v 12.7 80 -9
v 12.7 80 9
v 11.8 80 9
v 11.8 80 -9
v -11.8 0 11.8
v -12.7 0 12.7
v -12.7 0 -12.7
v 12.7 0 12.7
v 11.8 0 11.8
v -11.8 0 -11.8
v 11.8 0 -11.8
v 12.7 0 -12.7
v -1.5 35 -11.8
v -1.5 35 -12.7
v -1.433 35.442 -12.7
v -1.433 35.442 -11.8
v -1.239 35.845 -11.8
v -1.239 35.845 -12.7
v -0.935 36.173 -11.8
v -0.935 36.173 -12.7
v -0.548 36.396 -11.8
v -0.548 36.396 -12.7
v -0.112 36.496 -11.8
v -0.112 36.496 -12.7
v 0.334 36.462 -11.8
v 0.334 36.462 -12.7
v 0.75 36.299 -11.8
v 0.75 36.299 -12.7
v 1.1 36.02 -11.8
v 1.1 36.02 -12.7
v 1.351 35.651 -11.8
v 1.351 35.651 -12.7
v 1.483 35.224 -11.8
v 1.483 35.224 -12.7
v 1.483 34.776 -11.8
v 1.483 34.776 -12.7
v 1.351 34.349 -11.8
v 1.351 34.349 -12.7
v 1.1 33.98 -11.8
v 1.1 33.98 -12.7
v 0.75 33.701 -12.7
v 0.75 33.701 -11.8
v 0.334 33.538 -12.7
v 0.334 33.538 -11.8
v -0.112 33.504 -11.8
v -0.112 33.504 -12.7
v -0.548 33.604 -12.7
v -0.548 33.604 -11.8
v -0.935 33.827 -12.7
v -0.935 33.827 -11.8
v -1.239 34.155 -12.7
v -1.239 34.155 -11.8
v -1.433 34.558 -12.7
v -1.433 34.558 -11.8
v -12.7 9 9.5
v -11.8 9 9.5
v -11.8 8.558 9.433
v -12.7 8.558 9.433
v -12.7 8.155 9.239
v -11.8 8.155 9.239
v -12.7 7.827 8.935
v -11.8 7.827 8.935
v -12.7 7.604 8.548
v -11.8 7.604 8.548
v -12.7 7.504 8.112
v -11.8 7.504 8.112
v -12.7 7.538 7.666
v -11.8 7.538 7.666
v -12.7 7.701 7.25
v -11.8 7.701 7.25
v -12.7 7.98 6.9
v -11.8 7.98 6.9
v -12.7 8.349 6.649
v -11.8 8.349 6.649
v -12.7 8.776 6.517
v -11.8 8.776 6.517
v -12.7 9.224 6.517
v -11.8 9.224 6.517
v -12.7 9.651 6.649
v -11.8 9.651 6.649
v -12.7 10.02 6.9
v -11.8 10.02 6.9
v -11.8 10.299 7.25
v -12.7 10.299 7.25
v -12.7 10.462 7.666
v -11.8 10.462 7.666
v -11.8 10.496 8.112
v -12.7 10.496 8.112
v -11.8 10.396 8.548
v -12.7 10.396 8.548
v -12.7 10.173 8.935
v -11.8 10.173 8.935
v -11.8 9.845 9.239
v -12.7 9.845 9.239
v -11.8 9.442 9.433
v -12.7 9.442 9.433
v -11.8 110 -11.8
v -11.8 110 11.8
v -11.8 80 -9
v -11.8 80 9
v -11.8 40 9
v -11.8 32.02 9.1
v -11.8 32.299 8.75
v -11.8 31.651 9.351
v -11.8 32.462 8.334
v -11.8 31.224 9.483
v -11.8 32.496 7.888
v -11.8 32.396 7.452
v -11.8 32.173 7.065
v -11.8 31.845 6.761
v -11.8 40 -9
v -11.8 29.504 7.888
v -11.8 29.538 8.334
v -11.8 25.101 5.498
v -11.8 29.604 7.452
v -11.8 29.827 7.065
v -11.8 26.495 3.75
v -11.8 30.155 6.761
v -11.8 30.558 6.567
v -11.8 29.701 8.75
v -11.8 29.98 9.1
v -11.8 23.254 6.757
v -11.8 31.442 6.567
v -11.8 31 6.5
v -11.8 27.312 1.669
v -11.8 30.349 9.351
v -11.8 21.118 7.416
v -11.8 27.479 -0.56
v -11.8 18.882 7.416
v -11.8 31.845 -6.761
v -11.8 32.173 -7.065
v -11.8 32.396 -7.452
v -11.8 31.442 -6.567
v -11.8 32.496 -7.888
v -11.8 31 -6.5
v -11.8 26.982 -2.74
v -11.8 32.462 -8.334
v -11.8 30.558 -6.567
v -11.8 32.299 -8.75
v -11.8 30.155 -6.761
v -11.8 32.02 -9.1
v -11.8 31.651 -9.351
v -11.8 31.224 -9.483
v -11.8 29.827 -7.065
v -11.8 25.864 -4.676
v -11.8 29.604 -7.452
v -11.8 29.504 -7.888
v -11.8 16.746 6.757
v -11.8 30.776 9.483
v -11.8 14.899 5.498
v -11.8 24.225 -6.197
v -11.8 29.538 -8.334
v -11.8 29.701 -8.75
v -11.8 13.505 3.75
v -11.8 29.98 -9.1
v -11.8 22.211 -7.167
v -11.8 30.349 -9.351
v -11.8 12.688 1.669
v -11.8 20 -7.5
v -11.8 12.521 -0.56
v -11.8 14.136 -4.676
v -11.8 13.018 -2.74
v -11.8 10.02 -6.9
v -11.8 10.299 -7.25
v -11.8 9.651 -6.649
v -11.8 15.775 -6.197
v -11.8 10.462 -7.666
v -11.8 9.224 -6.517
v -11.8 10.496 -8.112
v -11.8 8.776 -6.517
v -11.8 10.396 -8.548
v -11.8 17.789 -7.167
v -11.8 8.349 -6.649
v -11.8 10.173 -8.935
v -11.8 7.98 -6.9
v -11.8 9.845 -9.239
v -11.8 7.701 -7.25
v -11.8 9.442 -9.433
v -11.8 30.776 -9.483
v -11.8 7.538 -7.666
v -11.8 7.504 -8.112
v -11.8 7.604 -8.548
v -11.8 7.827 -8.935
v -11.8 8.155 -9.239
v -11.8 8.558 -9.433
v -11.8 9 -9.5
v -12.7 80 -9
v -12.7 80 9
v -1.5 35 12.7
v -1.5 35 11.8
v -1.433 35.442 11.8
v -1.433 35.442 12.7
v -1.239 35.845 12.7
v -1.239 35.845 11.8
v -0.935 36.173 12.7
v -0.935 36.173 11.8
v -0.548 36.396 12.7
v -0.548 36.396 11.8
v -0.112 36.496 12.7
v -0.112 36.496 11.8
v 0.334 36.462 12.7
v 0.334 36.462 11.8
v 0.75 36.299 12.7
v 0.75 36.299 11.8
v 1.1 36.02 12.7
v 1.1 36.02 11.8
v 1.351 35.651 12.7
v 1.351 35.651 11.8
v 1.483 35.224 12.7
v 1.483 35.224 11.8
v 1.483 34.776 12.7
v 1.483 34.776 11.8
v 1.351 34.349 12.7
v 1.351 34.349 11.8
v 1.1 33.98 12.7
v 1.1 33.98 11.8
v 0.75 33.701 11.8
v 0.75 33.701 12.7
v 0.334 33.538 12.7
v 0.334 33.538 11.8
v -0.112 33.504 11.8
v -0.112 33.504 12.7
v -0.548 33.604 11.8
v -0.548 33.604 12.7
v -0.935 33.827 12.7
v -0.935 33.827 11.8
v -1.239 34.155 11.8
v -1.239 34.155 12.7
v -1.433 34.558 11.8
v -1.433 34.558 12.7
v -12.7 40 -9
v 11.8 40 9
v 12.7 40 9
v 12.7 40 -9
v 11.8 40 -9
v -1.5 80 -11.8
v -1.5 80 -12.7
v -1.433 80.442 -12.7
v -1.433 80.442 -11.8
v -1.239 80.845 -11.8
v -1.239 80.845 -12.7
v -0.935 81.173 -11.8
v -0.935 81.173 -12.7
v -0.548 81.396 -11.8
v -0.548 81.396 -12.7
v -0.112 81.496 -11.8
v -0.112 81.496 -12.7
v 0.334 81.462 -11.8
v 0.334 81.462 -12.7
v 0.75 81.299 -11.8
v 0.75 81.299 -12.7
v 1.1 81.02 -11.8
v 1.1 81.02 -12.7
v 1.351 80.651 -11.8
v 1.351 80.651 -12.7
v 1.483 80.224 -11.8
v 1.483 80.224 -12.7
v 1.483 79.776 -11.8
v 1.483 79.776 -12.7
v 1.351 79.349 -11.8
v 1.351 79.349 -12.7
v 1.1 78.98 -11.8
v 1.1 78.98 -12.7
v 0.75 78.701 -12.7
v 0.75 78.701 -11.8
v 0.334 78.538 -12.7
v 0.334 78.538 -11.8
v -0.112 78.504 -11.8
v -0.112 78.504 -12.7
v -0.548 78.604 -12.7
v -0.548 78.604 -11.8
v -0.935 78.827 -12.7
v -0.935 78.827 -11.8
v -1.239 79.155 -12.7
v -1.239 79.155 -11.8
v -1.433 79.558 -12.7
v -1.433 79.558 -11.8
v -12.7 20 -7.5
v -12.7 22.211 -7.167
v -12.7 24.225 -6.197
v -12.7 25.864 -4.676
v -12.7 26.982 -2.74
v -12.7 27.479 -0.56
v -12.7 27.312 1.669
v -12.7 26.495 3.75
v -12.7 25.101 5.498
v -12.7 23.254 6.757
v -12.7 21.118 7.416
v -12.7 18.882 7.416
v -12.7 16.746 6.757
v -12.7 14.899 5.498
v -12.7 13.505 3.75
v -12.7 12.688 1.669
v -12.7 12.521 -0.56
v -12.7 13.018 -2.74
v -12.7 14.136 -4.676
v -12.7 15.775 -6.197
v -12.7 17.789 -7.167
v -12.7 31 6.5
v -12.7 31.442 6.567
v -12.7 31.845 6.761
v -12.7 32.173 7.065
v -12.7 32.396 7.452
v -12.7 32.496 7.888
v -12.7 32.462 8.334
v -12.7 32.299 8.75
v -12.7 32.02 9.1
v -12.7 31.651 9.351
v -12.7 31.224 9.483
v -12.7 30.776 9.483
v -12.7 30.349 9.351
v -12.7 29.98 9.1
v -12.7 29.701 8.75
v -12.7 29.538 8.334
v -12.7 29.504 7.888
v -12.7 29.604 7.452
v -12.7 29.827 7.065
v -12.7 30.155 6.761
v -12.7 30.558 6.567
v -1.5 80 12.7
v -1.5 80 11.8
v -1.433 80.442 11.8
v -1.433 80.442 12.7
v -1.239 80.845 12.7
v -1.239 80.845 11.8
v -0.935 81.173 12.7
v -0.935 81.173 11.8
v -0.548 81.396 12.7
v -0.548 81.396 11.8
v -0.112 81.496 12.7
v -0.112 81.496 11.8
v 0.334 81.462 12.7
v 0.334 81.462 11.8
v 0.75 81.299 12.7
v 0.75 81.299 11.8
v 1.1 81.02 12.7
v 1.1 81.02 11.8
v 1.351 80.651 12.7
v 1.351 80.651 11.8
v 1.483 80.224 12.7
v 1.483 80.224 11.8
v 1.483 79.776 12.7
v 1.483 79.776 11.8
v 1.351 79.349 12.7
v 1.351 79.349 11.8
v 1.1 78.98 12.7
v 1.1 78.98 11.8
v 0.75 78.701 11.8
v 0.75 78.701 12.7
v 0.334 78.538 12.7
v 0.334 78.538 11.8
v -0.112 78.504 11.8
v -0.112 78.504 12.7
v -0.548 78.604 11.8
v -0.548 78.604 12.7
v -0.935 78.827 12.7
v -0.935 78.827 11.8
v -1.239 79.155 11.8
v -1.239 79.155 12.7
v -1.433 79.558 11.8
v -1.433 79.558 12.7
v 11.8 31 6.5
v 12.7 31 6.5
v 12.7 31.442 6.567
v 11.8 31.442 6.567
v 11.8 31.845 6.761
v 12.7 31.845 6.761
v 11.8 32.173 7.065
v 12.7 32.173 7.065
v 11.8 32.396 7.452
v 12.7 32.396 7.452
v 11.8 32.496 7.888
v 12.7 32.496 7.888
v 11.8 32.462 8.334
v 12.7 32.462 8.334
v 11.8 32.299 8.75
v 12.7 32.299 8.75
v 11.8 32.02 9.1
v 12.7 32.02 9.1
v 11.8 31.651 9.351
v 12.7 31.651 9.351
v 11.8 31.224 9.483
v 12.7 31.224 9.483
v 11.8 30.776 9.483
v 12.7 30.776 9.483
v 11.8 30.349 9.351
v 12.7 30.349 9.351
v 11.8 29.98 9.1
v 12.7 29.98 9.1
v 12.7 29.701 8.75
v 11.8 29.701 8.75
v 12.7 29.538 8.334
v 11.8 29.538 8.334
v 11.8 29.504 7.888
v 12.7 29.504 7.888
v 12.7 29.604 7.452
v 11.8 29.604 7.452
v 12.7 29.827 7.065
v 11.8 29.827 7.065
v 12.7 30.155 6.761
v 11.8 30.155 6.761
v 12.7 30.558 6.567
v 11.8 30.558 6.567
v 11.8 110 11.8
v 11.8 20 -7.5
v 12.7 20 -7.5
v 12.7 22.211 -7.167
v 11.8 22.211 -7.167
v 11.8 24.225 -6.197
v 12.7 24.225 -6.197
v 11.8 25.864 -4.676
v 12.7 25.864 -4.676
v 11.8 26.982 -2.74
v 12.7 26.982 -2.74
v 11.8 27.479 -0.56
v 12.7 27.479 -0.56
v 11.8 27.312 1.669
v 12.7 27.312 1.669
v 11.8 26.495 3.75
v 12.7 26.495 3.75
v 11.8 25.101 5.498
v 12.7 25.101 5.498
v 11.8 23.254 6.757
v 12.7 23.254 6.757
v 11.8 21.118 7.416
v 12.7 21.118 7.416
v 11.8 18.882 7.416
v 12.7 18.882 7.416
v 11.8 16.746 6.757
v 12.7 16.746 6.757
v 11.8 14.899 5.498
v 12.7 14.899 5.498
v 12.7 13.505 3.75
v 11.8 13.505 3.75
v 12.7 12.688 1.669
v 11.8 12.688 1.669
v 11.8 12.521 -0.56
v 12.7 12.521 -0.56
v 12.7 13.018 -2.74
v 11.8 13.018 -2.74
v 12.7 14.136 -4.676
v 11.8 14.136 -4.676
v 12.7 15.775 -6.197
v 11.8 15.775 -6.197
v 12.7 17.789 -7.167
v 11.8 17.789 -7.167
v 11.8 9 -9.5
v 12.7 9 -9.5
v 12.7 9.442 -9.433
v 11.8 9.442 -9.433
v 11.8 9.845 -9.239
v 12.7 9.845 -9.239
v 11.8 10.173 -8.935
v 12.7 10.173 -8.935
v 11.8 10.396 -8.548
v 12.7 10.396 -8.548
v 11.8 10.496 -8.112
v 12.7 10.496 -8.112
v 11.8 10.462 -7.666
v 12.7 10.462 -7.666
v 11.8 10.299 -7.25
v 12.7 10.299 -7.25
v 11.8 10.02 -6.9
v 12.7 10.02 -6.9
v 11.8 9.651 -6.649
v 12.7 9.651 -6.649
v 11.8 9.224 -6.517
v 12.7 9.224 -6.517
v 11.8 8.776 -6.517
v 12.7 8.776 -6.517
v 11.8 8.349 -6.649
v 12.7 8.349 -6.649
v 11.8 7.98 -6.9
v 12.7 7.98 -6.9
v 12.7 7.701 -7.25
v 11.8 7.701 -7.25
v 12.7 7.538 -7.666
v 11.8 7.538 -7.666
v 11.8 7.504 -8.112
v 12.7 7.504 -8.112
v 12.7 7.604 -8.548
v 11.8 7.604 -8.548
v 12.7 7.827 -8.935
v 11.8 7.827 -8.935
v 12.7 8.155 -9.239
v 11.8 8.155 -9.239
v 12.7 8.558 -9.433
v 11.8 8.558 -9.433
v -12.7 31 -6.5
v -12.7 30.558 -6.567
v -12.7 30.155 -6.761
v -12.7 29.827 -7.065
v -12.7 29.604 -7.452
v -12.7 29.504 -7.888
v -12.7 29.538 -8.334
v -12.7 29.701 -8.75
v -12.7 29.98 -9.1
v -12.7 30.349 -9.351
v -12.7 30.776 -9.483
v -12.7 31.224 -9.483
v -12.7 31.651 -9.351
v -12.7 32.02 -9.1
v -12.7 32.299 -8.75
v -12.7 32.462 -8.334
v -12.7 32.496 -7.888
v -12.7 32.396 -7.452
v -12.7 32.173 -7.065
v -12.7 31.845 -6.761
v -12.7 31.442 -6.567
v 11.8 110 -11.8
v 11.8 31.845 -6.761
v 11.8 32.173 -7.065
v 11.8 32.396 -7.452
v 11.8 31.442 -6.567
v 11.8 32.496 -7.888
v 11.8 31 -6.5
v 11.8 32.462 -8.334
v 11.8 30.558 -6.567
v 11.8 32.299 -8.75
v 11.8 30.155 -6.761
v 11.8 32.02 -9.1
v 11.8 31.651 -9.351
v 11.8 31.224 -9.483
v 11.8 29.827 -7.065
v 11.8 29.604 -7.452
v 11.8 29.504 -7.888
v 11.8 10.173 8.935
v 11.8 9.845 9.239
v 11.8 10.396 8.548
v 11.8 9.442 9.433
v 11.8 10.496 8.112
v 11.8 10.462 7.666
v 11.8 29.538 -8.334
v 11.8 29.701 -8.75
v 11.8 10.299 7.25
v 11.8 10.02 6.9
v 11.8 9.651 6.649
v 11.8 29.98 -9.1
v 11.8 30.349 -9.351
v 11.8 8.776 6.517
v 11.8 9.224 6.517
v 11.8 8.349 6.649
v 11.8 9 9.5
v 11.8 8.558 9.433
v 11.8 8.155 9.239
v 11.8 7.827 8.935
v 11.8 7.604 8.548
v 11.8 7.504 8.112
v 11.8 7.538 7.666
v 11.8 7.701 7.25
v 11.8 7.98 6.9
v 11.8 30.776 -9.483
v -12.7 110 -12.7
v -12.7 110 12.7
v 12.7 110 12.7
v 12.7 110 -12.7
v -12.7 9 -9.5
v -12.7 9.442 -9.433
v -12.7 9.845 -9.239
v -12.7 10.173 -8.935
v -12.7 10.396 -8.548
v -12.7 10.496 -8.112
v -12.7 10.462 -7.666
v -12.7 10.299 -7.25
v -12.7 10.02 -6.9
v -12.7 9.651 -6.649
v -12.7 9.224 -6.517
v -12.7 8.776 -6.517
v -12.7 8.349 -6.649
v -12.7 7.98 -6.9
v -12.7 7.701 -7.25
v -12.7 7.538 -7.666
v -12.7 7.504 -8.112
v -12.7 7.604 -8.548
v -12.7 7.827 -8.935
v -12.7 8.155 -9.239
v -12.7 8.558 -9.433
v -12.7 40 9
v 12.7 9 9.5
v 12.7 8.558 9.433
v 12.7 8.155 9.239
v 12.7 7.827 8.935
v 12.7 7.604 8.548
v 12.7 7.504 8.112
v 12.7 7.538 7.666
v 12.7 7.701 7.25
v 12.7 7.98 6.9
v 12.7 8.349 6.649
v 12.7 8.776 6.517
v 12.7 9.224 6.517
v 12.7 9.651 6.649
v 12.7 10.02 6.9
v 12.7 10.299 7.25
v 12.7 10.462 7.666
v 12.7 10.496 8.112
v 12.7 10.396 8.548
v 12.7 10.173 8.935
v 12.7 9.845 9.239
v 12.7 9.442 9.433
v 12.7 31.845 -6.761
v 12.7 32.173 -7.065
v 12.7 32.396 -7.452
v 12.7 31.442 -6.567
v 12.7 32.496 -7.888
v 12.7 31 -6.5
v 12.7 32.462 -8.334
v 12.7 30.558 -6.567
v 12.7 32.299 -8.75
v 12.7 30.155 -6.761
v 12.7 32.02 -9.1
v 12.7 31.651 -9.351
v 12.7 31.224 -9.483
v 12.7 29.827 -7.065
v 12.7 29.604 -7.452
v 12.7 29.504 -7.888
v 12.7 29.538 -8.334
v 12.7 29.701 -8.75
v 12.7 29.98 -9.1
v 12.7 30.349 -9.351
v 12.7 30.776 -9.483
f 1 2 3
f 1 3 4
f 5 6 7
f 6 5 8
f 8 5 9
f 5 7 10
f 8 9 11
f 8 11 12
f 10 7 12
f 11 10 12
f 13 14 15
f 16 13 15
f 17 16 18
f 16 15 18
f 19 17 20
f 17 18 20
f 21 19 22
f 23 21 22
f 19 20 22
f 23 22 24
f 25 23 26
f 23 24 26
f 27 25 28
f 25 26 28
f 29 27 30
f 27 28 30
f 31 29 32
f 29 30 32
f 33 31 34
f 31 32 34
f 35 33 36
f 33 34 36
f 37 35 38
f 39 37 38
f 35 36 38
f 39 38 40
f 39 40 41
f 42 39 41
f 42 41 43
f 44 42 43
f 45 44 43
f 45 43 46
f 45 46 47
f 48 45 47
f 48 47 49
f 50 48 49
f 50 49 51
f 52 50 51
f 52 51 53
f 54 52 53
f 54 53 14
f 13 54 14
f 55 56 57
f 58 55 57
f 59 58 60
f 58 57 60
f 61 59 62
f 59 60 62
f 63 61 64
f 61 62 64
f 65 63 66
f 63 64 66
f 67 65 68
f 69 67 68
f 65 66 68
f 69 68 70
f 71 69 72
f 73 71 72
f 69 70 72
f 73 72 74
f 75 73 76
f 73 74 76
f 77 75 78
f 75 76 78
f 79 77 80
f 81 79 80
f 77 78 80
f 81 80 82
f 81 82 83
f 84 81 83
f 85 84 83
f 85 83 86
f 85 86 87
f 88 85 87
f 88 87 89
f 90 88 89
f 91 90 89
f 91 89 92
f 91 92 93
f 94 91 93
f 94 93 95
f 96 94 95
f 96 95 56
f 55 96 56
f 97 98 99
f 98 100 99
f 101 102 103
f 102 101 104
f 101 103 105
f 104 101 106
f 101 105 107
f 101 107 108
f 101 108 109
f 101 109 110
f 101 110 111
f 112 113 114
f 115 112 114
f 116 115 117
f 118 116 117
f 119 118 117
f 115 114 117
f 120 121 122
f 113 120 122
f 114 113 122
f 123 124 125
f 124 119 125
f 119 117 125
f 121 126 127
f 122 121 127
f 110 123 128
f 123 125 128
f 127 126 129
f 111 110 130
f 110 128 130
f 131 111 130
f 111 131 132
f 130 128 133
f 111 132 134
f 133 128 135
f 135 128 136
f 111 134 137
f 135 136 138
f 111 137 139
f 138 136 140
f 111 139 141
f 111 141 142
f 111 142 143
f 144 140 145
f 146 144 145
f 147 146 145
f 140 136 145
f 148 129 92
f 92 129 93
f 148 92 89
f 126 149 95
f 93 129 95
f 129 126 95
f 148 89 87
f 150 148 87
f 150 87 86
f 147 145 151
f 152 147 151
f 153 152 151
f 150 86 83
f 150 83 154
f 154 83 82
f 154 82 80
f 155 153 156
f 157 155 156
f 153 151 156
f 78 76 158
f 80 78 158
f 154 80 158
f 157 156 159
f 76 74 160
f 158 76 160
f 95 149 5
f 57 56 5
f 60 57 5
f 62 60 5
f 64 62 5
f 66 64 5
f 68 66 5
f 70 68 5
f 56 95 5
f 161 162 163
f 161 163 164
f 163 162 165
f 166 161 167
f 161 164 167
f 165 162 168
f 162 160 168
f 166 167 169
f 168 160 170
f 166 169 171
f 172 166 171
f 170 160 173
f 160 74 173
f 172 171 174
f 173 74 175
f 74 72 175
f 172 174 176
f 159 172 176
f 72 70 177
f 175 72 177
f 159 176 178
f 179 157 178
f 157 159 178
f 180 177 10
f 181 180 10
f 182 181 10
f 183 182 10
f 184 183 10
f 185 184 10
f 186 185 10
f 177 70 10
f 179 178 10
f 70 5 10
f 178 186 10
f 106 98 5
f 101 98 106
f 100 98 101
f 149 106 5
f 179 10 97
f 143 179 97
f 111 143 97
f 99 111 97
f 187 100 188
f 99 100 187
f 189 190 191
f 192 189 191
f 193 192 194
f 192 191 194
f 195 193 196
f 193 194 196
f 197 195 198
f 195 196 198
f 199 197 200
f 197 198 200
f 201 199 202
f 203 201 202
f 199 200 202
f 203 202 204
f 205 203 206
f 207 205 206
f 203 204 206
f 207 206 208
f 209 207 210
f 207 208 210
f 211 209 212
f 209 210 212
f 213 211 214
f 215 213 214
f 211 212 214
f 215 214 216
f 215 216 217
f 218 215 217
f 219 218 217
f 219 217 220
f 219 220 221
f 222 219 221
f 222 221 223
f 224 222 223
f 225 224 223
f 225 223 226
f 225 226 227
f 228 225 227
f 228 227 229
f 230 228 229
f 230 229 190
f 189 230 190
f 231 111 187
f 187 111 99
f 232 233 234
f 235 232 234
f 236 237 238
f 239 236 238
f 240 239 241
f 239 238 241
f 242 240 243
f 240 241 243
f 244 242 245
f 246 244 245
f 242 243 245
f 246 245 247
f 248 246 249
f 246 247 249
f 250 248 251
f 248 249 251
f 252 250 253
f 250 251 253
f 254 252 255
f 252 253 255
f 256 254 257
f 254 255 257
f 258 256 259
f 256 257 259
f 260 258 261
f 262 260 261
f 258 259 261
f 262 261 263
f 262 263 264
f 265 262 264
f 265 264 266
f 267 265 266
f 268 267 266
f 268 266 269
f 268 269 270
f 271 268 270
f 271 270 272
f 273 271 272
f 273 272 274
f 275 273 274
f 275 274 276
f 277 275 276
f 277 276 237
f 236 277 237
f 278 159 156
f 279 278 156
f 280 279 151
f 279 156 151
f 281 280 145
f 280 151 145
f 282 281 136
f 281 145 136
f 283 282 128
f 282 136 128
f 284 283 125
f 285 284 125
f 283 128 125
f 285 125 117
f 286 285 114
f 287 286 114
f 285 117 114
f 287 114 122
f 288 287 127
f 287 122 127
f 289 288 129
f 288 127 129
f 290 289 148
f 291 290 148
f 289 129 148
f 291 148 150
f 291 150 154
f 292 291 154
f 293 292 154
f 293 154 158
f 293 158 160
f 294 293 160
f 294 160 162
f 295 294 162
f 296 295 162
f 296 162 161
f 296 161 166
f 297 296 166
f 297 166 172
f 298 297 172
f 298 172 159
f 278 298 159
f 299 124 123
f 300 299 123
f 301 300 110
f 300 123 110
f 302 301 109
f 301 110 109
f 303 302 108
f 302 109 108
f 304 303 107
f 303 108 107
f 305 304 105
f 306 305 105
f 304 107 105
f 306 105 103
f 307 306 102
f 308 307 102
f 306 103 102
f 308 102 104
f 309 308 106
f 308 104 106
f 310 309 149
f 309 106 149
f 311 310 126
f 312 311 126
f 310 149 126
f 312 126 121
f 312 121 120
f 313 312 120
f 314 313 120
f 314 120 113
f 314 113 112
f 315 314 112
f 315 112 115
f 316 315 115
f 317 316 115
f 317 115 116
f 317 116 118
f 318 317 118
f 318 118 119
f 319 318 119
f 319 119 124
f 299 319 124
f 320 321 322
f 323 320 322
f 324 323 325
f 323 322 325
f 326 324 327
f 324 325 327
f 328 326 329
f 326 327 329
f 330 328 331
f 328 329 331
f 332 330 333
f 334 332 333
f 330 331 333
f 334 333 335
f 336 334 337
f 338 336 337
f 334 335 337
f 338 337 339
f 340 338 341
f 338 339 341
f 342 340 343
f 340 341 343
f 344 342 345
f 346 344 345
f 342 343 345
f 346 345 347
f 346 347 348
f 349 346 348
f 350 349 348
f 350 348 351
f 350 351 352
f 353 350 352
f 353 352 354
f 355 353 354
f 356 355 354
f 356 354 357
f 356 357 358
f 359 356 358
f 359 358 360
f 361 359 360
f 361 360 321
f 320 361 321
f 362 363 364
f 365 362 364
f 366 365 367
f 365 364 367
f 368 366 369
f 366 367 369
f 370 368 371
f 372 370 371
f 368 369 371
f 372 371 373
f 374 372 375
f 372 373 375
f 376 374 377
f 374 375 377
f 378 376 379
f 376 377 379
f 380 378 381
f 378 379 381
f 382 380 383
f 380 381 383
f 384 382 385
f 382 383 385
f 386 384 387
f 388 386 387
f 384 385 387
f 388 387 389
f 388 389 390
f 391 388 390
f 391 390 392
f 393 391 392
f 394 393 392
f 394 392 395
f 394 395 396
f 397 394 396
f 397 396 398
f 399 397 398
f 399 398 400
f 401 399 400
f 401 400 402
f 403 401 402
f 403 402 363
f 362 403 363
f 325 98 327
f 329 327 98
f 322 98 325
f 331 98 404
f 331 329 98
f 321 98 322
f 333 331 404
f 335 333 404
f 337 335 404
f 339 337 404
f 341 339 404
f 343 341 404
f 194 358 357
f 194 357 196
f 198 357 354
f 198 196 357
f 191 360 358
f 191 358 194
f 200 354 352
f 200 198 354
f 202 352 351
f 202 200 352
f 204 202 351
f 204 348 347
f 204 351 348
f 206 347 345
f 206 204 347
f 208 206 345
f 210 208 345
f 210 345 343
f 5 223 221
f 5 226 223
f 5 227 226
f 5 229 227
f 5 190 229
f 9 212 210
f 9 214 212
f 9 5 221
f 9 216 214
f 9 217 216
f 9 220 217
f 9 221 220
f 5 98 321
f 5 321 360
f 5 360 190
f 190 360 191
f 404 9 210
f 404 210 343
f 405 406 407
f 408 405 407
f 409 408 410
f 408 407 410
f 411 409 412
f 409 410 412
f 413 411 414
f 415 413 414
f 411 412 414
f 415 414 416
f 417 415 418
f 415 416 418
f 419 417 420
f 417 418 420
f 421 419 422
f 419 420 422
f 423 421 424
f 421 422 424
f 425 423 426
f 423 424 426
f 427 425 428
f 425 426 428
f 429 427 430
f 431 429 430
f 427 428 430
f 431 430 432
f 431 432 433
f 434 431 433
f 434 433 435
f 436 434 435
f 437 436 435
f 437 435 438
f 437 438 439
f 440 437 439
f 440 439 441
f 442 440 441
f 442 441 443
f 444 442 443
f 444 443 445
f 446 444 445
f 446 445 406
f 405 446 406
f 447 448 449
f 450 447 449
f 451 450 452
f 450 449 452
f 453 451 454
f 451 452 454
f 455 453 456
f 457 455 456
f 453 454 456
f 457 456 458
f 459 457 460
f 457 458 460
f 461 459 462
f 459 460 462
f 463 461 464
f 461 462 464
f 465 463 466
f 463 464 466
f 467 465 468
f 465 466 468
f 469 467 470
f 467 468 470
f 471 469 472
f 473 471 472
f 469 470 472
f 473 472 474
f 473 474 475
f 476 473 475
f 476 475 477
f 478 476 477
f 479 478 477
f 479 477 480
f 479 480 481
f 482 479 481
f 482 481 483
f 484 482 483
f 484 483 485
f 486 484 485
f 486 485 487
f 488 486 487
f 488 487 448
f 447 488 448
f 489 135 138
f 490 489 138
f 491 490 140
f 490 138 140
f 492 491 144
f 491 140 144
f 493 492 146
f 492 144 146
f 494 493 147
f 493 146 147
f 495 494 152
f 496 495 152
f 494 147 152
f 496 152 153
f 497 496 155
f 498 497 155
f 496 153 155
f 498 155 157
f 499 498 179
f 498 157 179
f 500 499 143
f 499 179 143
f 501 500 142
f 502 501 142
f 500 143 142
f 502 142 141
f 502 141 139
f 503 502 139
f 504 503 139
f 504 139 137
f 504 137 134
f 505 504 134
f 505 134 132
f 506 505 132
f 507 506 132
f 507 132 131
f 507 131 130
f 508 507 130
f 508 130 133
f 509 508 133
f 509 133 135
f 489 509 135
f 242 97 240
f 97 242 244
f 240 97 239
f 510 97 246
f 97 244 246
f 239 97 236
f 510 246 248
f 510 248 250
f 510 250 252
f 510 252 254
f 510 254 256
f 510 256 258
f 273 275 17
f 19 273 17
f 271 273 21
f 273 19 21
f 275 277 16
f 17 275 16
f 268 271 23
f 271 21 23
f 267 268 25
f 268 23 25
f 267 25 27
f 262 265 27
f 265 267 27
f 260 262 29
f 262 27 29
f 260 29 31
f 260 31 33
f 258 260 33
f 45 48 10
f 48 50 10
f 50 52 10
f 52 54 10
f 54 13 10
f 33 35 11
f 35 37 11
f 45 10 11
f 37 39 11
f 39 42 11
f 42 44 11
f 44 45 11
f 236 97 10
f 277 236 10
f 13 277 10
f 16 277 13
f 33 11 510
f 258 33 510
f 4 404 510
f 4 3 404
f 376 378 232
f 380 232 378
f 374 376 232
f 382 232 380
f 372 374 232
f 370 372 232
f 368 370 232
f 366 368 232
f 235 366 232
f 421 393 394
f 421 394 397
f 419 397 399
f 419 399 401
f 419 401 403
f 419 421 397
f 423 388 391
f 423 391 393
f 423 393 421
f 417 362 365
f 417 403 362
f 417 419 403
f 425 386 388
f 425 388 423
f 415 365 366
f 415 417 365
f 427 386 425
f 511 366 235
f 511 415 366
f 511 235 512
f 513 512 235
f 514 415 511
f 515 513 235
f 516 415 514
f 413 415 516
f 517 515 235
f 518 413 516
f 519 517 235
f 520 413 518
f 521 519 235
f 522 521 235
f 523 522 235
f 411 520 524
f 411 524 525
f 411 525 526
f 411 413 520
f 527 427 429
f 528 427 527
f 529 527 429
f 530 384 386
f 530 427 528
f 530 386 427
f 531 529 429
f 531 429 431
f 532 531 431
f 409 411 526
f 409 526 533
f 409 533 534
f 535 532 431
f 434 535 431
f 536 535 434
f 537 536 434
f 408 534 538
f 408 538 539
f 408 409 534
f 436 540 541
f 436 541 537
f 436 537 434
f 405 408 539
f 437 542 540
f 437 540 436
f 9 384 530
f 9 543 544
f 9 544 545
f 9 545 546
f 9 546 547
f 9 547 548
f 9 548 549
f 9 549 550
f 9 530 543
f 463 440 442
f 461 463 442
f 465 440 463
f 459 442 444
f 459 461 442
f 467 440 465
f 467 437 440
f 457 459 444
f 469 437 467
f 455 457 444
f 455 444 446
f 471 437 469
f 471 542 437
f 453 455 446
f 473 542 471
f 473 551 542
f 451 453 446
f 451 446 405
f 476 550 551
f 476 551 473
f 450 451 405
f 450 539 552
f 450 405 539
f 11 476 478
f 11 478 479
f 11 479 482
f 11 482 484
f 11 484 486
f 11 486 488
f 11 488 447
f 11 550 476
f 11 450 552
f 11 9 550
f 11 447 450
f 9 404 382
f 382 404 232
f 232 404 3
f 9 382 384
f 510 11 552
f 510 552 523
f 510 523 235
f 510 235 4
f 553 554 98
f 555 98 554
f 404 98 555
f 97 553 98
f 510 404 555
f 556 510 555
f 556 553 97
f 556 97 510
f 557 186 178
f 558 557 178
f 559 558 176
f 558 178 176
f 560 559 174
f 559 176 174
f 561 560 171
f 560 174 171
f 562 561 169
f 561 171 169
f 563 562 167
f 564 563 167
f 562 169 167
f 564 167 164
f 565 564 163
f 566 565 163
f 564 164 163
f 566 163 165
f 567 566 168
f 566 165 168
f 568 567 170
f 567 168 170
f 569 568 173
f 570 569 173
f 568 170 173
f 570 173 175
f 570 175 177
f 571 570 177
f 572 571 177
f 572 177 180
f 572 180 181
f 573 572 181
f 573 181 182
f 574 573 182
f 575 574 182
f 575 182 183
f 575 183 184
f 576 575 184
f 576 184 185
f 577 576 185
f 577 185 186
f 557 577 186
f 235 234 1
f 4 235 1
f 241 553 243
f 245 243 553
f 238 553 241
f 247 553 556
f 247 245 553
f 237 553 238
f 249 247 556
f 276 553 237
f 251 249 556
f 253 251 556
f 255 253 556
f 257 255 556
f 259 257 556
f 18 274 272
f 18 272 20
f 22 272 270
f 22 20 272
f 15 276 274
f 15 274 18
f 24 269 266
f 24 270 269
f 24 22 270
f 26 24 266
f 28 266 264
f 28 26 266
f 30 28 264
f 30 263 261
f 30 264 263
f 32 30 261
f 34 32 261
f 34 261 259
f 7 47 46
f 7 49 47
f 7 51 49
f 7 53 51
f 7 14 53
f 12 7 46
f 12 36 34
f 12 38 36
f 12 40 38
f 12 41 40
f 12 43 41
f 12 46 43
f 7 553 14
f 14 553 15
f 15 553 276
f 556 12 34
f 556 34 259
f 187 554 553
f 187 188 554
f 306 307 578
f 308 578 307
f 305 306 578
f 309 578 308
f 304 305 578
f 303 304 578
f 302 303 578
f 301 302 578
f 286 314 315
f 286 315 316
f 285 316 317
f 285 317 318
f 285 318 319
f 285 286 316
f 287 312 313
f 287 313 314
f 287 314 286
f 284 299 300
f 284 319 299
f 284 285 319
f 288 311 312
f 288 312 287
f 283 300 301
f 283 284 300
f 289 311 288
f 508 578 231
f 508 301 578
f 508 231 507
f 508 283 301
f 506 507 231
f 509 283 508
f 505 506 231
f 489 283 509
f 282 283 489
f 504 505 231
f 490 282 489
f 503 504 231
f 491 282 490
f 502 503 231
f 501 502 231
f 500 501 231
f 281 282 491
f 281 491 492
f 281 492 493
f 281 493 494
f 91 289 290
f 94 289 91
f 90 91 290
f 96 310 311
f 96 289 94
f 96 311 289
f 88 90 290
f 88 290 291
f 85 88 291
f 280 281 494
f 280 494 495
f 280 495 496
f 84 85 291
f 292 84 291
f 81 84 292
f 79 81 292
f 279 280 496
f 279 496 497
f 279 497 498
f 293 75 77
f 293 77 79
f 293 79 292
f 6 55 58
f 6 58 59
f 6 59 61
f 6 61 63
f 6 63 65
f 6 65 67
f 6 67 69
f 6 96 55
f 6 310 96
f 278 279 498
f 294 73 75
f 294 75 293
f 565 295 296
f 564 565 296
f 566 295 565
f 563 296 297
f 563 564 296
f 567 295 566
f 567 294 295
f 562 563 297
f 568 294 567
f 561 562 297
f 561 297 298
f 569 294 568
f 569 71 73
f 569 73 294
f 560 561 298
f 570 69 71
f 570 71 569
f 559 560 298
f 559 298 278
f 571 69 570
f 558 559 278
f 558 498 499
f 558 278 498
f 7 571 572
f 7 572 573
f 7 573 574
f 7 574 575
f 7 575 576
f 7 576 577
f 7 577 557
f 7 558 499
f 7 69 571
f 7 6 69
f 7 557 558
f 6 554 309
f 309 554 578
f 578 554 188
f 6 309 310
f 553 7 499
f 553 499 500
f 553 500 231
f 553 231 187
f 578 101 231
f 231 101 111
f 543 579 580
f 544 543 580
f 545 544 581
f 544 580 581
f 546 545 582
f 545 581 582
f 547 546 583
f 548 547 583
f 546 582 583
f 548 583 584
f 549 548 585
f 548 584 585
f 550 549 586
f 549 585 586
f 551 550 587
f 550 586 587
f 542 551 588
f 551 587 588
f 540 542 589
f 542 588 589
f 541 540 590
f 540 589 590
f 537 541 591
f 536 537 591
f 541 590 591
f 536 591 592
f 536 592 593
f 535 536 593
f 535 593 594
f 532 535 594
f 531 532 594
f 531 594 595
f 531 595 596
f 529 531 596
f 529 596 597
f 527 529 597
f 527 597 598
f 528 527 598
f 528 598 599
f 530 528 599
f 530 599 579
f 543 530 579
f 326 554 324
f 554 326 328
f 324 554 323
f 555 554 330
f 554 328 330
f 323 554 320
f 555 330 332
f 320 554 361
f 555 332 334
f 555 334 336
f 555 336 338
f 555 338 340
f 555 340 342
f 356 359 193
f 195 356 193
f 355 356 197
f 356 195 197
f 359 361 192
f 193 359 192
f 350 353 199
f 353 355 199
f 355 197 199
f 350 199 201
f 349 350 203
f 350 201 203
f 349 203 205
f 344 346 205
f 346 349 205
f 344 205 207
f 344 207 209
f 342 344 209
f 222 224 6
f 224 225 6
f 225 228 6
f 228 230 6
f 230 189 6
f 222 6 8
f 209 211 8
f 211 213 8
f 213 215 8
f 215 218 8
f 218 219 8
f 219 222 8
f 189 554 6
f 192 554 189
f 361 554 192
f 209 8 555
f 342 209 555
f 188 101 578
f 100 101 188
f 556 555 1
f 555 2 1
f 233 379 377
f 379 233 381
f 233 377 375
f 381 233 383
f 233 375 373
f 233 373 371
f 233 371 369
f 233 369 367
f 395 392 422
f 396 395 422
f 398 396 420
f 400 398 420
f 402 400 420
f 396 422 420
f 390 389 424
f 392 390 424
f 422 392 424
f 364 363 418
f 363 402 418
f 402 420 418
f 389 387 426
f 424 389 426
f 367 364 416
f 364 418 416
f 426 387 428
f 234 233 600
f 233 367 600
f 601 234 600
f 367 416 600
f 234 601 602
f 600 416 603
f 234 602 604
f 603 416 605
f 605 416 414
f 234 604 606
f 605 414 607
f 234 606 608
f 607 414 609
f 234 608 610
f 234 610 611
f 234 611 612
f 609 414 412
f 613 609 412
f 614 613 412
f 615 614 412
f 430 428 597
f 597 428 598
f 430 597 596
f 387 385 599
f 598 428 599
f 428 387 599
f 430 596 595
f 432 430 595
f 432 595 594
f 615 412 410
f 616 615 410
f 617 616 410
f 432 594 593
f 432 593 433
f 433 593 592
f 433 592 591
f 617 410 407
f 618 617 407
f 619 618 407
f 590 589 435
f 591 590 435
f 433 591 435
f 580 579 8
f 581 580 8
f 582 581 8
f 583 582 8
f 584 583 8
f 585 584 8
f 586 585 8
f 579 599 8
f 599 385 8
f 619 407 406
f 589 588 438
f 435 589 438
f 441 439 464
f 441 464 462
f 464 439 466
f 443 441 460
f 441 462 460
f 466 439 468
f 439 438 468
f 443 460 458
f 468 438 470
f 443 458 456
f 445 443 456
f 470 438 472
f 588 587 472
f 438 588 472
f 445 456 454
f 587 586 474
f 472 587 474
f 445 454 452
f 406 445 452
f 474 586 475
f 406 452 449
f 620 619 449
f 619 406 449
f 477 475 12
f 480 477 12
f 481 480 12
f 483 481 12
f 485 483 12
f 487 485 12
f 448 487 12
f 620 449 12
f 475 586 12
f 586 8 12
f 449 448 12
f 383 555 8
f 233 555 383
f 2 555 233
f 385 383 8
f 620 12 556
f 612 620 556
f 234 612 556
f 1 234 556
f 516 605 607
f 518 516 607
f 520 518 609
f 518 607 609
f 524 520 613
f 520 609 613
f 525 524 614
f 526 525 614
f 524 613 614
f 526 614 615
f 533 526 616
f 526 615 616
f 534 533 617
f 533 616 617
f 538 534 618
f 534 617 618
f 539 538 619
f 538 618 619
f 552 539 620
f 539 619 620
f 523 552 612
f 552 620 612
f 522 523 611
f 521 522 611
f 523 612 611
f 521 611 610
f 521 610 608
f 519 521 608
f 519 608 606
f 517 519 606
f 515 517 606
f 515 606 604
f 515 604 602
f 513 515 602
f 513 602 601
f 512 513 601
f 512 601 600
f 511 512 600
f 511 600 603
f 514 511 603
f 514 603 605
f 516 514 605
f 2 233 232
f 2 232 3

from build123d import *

# Parameters (mm, degrees)
SKETCH1_W           = 25.4
SKETCH1_H           = 25.4
SKETCH1_W_2         = 23.6
SKETCH1_H_2         = 23.6
BOSS_EXTRUDE1_DEPTH = 110
SKETCH2_R           = 7.5
SKETCH2_W           = 18
SKETCH2_H           = 40
CUT_EXTRUDE1_DEPTH  = 25.4
SKETCH3_R           = 1.5
CUT_EXTRUDE2_DEPTH  = 25.4
SKETCH4_R           = 1.5
CUT_EXTRUDE3_DEPTH  = 25.4


with BuildPart() as part:
    # Sketch1 → Boss-Extrude1 (new body)
    with BuildSketch(Plane(origin=(0, 0, 0), x_dir=(1, 0, 0), z_dir=(0, 1, 0))):
        Rectangle(SKETCH1_W, SKETCH1_H)
        Rectangle(SKETCH1_W_2, SKETCH1_H_2, mode=Mode.SUBTRACT)
    extrude(amount=BOSS_EXTRUDE1_DEPTH)

    # Sketch2 → Cut-Extrude1 (cut)
    with BuildSketch(Plane(origin=(12.7, 0, 0), x_dir=(0, 0, -1), z_dir=(1, 0, 0))):
        with Locations((0, 20)):
            Circle(SKETCH2_R)
        with Locations((0, 60)):
            Rectangle(SKETCH2_W, SKETCH2_H)
    extrude(amount=-CUT_EXTRUDE1_DEPTH, mode=Mode.SUBTRACT)

    # Sketch3 → Cut-Extrude2 (cut)
    with BuildSketch(Plane(origin=(0, 0, -12.7), x_dir=(-1, 0, 0), z_dir=(0, 0, -1))):
        with Locations((0, 35)):
            Circle(SKETCH3_R)
        with Locations((0, 80)):
            Circle(SKETCH3_R)
    extrude(amount=-CUT_EXTRUDE2_DEPTH, mode=Mode.SUBTRACT)

    # Sketch4 → Cut-Extrude3 (cut)
    with BuildSketch(Plane(origin=(12.7, 0, 0), x_dir=(0, 0, -1), z_dir=(1, 0, 0))):
        with Locations((8, 9)):
            Circle(SKETCH4_R)
        with Locations(Location((8, 31, 0), (0, 0, 180))):
            Circle(SKETCH4_R)
        with Locations(Location((-8, 9, 0), (0, 0, 180))):
            Circle(SKETCH4_R)
        with Locations((-8, 31)):
            Circle(SKETCH4_R)
    extrude(amount=-CUT_EXTRUDE3_DEPTH, mode=Mode.SUBTRACT)


solid = part.part
